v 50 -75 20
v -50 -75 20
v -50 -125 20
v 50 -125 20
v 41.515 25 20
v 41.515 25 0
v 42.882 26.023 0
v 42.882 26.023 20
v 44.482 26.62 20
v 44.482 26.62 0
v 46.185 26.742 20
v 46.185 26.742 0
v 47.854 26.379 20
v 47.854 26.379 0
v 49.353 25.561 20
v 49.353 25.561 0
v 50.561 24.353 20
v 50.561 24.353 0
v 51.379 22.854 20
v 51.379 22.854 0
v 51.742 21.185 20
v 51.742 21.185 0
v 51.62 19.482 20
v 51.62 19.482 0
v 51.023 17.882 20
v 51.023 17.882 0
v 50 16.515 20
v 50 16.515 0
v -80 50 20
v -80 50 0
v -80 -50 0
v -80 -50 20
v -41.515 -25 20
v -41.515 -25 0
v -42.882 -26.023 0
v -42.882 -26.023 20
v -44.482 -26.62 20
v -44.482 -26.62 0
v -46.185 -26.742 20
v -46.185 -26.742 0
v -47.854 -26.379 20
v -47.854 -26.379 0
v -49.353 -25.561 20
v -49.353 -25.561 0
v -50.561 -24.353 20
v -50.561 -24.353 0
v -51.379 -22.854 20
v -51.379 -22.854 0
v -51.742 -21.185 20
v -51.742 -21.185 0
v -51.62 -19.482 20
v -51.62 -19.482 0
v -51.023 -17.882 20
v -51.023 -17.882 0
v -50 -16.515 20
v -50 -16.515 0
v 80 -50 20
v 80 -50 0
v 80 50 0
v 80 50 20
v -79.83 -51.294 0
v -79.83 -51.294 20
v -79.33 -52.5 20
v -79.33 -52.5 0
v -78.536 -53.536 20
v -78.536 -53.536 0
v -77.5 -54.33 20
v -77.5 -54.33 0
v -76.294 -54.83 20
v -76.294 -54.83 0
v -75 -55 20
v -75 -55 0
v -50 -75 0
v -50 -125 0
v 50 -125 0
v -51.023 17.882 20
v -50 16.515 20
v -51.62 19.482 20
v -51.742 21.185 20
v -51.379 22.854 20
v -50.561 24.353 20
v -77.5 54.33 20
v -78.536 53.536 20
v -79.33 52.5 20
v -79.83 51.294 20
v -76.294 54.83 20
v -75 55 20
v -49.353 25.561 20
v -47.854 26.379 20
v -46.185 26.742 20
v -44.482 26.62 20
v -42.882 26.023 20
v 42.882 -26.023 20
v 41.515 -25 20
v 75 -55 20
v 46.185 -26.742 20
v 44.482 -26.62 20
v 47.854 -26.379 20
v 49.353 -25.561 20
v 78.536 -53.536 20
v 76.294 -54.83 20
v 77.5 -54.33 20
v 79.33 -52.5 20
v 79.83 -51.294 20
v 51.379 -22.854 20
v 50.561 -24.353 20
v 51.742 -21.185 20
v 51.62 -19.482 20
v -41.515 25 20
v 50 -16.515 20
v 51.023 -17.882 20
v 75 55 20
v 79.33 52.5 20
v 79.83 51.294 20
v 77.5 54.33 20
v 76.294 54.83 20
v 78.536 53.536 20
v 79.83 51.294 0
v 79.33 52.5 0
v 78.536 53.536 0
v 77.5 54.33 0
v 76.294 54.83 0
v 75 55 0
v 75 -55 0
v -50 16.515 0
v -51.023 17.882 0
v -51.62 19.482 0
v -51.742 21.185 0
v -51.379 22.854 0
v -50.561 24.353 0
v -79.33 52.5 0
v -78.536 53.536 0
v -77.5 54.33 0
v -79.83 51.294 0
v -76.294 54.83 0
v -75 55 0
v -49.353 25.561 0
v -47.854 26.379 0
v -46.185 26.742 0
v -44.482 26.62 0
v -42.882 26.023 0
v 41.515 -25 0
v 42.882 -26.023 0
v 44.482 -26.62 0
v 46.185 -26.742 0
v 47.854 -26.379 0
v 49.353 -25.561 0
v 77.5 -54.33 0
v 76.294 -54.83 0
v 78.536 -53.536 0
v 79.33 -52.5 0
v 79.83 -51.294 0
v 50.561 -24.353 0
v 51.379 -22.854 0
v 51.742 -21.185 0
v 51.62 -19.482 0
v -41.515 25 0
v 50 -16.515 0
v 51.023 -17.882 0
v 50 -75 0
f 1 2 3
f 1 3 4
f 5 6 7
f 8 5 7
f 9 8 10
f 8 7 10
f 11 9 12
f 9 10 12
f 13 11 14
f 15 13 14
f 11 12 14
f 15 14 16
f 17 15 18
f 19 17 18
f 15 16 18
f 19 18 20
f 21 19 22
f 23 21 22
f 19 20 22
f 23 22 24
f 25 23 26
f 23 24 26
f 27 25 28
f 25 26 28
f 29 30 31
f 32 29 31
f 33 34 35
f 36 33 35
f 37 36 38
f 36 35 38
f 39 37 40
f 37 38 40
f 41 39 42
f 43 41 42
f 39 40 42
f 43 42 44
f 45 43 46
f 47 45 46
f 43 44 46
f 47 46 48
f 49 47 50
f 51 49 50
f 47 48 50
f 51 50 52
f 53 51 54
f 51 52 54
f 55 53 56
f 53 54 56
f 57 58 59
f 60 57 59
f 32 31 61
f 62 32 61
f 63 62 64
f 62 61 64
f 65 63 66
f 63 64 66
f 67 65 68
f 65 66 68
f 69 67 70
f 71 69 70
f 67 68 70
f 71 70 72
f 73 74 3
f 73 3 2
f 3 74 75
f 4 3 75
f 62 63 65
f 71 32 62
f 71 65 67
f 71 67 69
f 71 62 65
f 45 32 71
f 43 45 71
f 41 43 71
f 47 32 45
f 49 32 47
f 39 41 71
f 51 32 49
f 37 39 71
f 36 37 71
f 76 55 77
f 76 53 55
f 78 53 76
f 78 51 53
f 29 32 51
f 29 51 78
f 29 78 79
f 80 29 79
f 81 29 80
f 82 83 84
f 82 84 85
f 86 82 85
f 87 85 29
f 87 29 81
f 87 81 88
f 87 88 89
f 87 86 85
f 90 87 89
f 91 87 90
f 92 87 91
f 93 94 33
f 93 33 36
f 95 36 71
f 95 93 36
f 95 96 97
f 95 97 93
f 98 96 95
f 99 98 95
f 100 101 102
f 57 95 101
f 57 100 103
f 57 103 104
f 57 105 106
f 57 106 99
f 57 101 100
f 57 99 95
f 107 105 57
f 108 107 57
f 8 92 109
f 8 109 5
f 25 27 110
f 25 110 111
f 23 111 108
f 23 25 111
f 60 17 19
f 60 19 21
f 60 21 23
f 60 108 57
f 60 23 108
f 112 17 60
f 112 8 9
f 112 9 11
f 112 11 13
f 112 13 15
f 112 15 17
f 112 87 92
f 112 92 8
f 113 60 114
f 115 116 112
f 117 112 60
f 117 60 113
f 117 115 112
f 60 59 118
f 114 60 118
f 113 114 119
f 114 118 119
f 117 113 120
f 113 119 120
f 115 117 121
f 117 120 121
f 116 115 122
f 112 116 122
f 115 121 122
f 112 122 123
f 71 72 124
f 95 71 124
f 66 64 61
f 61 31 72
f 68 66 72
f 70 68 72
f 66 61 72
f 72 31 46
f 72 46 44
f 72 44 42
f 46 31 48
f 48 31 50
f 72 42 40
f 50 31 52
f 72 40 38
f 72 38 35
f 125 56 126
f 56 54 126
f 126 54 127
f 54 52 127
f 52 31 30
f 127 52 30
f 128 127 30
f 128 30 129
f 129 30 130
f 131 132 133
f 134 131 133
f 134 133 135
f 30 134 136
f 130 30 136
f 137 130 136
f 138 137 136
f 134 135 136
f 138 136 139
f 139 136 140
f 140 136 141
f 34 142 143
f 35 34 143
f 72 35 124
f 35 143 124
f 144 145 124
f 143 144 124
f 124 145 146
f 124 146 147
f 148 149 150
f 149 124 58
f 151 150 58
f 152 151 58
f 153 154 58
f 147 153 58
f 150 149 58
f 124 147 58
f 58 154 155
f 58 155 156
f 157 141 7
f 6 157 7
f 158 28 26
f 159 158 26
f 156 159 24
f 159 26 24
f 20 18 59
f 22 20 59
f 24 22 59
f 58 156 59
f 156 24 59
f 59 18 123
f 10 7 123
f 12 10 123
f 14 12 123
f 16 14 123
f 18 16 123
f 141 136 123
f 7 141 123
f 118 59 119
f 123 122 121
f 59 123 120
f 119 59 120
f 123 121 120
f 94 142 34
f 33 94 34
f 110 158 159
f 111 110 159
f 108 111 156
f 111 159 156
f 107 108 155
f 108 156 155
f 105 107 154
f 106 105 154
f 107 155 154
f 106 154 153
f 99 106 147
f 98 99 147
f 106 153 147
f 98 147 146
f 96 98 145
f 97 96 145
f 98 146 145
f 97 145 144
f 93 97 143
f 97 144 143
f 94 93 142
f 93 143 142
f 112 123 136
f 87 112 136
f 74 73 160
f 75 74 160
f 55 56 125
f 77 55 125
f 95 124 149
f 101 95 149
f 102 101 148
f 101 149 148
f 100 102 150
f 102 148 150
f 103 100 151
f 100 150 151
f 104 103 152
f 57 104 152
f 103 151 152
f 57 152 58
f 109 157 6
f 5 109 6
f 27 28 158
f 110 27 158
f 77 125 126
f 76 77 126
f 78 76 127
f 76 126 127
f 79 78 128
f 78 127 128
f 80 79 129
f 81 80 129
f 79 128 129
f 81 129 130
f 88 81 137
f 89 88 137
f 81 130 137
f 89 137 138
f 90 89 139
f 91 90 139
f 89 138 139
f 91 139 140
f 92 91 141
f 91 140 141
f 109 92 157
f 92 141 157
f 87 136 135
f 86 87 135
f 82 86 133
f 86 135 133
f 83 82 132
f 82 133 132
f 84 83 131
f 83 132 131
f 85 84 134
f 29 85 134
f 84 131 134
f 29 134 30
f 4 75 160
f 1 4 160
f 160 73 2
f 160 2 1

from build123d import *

# Parameters (mm, degrees)
F0_W     = 100
F0_H     = 50
F1_DEPTH = 20


with BuildPart() as f1:
    # F0 (on Top) → F1 (new body)
    with BuildSketch(Plane.XY):
        with BuildLine():
            Line((75, 55), (-75, 55))
            ThreePointArc((-75, 55), (-78.535534, 53.535534), (-80, 50))
            Line((-80, 50), (-80, -50))
            ThreePointArc((-80, -50), (-78.535534, -53.535534), (-75, -55))
            Line((-75, -55), (75, -55))
            ThreePointArc((75, -55), (78.535534, -53.535534), (80, -50))
            Line((80, -50), (80, 50))
            ThreePointArc((80, 50), (78.535534, 53.535534), (75, 55))
        make_face()
        with BuildLine():
            ThreePointArc((-50, 16.514719), (-50, 25), (-41.514719, 25))
            Line((-41.514719, 25), (41.514719, 25))
            ThreePointArc((41.514719, 25), (50, 25), (50, 16.514719))
            Line((50, 16.514719), (50, -16.514719))
            ThreePointArc((50, -16.514719), (50, -25), (41.514719, -25))
            Line((41.514719, -25), (-41.514719, -25))
            ThreePointArc((-41.514719, -25), (-50, -25), (-50, -16.514719))
            Line((-50, -16.514719), (-50, 16.514719))
        make_face(mode=Mode.SUBTRACT)
        with Locations((0, -100)):
            Rectangle(F0_W, F0_H)
    extrude(amount=F1_DEPTH)


solid = f1.part
